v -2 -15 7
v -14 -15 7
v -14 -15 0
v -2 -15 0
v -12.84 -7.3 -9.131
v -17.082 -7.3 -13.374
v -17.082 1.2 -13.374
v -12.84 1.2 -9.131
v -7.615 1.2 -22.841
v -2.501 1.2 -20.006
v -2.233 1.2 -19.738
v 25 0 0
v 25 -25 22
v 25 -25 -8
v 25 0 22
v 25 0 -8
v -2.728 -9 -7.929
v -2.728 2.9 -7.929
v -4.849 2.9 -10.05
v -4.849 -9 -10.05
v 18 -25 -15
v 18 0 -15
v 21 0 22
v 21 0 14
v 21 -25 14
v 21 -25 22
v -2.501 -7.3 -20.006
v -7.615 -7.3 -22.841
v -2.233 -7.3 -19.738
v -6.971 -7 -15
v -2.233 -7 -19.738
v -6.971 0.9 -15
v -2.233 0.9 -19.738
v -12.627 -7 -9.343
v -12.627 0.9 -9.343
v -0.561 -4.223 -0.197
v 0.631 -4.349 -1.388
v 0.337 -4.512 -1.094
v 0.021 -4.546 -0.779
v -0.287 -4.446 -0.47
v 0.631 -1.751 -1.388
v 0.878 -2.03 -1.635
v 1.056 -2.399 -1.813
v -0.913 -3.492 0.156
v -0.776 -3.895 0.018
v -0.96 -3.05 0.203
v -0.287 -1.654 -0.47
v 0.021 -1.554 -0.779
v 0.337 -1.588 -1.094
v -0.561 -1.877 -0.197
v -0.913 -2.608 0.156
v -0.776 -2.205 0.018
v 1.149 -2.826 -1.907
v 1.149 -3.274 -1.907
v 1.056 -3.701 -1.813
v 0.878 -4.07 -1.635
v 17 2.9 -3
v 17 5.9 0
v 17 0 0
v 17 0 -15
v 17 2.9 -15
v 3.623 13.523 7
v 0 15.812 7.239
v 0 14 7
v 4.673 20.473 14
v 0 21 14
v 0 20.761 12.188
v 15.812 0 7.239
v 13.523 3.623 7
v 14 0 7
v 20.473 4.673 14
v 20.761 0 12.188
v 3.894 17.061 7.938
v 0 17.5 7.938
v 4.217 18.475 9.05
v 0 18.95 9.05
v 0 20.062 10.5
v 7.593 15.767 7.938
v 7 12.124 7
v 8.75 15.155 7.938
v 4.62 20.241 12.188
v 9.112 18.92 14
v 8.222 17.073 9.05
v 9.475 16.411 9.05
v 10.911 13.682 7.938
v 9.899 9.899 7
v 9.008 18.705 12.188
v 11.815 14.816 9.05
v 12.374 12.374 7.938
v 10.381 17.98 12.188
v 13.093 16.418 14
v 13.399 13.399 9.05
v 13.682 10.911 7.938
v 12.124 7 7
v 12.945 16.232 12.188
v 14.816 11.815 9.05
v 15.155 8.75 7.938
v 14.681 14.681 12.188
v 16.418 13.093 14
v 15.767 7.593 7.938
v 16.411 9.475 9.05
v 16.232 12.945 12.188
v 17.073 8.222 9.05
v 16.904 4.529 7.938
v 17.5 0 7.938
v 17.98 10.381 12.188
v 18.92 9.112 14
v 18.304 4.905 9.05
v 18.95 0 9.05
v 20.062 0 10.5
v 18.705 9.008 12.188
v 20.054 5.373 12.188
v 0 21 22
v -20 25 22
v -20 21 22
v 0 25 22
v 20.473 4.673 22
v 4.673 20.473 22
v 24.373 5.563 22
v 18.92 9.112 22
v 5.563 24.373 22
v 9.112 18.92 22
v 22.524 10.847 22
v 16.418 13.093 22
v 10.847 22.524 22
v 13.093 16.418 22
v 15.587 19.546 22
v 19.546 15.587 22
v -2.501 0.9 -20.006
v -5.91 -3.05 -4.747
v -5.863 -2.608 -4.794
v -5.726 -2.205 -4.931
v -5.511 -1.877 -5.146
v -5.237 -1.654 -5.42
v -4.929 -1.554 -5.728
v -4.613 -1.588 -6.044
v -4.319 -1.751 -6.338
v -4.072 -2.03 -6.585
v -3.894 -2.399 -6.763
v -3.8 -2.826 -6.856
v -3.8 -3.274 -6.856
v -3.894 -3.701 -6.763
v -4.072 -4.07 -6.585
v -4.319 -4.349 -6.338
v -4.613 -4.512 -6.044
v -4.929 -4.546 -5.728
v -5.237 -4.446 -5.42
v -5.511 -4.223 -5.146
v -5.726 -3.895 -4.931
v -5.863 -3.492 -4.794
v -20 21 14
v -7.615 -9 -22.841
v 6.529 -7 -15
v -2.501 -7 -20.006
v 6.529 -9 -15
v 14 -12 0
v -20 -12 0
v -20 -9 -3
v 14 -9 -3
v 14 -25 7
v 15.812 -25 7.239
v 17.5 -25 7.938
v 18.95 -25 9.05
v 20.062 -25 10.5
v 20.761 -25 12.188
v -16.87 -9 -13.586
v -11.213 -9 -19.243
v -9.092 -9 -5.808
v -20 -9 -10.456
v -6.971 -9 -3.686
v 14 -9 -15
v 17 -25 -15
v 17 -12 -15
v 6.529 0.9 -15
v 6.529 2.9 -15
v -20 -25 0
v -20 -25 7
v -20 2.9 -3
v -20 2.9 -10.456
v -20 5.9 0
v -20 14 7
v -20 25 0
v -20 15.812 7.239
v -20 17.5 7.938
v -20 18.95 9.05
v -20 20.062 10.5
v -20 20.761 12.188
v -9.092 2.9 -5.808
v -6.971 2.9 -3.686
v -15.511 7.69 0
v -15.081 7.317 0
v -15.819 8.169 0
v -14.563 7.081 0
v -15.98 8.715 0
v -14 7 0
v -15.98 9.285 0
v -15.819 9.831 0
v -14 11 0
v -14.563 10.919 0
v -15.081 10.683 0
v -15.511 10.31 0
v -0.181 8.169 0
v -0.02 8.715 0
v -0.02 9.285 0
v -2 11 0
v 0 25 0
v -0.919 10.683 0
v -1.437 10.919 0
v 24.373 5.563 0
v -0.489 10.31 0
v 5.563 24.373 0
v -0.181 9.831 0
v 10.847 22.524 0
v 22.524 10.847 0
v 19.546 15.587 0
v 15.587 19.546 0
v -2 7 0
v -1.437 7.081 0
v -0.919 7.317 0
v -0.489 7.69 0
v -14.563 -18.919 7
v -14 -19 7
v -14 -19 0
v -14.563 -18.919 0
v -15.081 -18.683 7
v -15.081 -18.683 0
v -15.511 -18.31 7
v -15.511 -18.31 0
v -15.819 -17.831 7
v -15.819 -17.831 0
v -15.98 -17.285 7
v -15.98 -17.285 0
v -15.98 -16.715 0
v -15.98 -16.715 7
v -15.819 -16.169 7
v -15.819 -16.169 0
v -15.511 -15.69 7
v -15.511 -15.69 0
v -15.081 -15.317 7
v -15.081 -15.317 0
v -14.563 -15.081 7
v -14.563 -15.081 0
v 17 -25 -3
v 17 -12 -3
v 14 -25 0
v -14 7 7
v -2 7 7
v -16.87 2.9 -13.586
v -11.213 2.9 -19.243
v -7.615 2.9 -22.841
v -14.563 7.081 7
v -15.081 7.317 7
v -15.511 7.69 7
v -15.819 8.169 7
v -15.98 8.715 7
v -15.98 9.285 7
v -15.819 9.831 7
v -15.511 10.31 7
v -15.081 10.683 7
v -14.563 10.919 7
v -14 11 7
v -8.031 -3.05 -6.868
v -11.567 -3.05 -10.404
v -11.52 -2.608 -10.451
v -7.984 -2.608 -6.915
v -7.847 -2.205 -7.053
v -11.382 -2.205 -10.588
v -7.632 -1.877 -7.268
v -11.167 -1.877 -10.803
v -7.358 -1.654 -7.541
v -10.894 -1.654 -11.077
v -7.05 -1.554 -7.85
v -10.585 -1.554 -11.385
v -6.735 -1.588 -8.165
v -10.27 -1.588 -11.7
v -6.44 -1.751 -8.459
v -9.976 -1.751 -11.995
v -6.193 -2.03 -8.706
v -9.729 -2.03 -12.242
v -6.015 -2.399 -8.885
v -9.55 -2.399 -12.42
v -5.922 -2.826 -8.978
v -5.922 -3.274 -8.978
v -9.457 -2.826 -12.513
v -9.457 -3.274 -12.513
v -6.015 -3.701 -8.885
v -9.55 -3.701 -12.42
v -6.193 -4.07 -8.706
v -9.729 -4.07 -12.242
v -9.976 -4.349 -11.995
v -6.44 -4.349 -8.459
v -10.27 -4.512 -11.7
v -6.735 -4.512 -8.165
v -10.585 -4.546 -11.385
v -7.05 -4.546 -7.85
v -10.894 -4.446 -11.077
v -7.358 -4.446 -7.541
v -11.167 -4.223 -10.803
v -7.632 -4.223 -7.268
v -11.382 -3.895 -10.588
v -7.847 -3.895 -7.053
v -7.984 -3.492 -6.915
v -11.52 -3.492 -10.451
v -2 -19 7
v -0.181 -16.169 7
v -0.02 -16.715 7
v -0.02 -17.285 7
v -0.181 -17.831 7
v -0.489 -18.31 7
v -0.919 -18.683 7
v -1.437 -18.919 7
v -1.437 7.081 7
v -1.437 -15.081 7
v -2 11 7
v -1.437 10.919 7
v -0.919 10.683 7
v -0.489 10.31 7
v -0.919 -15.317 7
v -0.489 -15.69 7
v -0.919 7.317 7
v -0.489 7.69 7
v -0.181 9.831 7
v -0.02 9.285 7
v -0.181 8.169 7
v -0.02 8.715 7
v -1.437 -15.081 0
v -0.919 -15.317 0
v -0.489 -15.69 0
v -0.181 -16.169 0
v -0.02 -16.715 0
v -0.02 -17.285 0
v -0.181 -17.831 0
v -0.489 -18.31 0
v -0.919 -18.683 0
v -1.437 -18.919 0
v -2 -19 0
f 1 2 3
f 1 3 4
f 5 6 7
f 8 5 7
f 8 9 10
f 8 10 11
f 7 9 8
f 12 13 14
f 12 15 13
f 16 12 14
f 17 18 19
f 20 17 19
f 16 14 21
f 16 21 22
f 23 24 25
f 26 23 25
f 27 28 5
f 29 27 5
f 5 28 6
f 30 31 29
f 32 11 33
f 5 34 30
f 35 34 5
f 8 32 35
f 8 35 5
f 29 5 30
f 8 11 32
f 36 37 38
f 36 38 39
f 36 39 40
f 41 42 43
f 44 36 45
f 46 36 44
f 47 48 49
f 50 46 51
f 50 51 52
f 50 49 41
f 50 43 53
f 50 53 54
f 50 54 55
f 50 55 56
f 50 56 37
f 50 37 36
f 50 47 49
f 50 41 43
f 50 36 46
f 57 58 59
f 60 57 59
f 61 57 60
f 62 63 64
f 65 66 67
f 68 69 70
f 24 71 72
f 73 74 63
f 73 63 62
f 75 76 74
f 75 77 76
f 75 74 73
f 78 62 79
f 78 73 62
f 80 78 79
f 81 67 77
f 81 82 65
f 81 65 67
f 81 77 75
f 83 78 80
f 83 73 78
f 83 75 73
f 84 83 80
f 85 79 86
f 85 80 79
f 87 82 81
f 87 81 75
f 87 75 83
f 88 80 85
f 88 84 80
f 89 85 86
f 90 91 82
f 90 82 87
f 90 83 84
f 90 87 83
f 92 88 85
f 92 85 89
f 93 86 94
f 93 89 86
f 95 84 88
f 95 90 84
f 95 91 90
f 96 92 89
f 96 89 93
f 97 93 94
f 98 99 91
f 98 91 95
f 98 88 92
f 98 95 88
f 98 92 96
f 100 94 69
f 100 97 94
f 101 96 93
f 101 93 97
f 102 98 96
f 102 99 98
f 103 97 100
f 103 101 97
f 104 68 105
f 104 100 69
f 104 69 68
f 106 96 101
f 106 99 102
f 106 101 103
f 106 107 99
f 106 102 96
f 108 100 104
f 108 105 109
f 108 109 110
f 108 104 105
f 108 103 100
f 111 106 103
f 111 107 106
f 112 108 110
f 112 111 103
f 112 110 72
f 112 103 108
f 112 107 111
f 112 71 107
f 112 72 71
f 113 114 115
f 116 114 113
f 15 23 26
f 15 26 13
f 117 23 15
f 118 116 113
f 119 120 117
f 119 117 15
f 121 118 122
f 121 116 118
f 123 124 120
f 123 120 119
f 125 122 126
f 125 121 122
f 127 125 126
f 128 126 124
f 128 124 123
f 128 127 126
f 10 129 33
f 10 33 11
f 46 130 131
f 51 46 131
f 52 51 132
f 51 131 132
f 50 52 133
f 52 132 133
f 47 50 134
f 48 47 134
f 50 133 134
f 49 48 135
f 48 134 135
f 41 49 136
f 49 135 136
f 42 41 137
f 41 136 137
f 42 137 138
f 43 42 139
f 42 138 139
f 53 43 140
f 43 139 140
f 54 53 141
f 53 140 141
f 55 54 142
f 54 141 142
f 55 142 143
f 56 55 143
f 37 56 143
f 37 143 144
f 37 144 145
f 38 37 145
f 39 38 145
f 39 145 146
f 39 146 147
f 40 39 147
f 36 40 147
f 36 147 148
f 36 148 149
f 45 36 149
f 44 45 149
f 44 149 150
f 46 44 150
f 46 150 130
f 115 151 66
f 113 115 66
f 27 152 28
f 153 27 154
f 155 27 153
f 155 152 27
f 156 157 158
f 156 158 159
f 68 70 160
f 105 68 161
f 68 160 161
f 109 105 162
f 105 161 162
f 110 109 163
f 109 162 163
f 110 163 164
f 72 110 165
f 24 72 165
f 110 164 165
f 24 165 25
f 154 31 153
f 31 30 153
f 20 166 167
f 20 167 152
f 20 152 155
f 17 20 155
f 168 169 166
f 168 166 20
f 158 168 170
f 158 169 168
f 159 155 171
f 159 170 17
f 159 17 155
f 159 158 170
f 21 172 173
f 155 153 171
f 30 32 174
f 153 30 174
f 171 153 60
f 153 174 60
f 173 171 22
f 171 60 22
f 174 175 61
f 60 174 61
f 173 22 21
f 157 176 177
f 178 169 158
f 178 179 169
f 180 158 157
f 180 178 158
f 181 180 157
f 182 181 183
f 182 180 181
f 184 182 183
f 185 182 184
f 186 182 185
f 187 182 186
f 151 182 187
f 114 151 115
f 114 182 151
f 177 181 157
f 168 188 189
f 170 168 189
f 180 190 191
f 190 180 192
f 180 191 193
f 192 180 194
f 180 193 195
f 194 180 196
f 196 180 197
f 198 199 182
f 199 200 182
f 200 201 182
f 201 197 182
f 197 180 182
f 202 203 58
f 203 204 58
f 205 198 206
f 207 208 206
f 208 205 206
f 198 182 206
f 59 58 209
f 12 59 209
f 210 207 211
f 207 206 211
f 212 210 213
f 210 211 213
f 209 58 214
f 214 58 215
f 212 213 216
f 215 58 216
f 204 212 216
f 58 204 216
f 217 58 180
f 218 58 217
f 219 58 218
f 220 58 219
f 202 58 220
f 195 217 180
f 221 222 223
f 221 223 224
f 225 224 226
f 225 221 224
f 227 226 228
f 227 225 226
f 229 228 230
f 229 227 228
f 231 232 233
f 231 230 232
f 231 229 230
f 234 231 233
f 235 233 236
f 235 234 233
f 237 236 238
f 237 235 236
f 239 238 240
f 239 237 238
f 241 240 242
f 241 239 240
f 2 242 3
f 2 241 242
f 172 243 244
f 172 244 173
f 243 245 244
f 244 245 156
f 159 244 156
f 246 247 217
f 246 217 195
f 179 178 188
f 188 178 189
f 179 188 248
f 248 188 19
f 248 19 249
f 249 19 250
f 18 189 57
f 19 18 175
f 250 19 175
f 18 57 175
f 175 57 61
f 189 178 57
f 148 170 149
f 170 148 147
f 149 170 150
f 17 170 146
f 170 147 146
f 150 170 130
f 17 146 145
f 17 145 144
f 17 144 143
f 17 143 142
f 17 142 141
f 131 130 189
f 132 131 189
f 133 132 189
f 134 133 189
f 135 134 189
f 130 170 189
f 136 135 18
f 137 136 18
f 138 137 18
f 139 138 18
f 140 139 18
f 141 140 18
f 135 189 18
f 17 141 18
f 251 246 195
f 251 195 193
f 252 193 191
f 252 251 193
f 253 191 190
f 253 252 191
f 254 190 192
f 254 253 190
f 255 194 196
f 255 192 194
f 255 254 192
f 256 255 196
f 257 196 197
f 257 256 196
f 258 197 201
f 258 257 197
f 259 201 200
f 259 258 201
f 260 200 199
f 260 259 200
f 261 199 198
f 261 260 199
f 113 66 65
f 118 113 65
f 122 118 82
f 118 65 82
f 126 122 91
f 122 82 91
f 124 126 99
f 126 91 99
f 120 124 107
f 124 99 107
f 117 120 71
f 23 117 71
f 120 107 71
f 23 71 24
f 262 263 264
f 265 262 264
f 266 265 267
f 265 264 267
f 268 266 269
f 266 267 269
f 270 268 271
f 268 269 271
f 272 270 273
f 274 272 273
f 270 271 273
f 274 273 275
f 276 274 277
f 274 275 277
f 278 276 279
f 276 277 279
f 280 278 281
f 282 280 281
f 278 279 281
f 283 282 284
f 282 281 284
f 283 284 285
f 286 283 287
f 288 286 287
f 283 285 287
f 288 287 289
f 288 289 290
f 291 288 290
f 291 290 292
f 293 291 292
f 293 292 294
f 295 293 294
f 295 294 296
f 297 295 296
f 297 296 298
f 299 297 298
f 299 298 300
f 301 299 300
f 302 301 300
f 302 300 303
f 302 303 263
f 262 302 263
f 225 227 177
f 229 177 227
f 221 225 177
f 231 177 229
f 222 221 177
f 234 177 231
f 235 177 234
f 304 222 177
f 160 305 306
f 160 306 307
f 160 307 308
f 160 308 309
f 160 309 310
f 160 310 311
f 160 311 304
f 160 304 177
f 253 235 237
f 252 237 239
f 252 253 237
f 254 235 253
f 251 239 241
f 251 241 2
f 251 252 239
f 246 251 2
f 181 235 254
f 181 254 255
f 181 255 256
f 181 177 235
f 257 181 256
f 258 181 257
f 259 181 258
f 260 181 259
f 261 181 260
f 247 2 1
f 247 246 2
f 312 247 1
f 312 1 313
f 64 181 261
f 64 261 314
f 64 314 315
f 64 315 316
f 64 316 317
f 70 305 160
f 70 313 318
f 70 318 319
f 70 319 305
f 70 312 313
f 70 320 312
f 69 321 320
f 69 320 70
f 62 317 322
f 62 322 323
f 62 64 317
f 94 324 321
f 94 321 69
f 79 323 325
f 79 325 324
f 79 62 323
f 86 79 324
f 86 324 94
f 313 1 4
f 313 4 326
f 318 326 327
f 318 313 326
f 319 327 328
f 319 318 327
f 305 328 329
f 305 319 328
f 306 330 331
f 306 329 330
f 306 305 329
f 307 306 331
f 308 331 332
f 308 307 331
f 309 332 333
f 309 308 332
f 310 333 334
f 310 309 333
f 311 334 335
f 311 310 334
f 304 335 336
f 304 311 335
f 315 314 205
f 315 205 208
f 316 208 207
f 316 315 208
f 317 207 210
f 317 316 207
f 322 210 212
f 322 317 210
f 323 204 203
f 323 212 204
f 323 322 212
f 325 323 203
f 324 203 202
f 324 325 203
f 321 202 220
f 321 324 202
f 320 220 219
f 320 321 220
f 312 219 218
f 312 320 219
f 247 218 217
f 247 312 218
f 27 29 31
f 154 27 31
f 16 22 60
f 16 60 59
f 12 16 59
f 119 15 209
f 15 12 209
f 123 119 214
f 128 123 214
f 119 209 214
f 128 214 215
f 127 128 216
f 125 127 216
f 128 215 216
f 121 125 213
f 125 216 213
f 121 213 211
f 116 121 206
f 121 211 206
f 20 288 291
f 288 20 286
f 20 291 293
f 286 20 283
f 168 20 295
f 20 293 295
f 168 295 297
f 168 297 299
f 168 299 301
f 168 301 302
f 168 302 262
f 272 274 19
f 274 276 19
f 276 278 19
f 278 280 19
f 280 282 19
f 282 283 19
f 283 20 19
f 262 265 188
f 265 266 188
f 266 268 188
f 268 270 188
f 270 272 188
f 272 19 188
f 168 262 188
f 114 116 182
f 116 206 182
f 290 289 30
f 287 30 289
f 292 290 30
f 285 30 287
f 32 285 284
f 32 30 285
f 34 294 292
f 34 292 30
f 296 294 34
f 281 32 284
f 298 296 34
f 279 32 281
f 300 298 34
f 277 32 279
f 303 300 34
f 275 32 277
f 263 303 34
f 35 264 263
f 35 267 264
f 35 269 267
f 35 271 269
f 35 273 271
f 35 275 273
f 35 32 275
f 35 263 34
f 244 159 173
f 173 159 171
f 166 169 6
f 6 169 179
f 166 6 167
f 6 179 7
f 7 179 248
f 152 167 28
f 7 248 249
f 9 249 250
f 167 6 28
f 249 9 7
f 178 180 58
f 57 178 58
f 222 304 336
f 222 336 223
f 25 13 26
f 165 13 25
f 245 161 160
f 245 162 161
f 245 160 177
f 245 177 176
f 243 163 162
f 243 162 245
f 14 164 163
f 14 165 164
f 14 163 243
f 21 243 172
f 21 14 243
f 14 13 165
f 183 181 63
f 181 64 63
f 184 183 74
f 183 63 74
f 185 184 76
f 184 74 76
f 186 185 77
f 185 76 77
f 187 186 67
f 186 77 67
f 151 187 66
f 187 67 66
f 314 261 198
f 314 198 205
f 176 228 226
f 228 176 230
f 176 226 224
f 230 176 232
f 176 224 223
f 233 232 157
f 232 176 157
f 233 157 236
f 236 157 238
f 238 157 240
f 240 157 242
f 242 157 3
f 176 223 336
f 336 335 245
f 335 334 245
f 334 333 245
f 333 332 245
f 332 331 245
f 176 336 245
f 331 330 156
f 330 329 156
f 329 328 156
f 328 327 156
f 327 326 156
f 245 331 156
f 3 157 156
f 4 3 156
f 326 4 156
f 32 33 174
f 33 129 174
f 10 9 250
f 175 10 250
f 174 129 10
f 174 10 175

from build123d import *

# Parameters (mm, degrees)
BOSS_EXTRUDE1_DEPTH      = 7
EXTRUDE_THIN2_DEPTH      = 15
FILLET1_R                = 7
SKETCH5_W                = 15
SKETCH5_H                = 25
BOSS_EXTRUDE2_DEPTH      = 8
CUT_EXTRUDE2_DEPTH       = 42.641325627
LPATTERN1_COUNT          = 2
LPATTERN1_PITCH          = 26
CHAMFER3_SIZE            = 7
SKETCH9_W                = 15
SKETCH9_H                = 7
BOSS_EXTRUDE3_DEPTH      = 15
BOSS_EXTRUDE4_DEPTH      = 2
BOSS_EXTRUDE4_DEPTH_BACK = 9.9
SKETCH13_W               = 8
SKETCH13_H               = 2
BOSS_EXTRUDE6_DEPTH      = 6
CHAMFER6_SIZE            = 23.744712882
CHAMFER6_SIZE_2          = 13.5
CHAMFER7_SIZE            = 3
SKETCH14_R               = 1.5
CUT_EXTRUDE3_DEPTH       = 15
SKETCH15_W               = 15
SKETCH15_H               = 8.5
CUT_EXTRUDE4_DEPTH       = 6


with BuildPart() as part:
    # Sketch1 → Boss-Extrude1 (new body)
    with BuildSketch(Plane.XY):
        with BuildLine():
            Line((0, 25), (-20, 25))
            Line((-20, 25), (-20, -25))
            Line((-20, -25), (25, -25))
            Line((25, -25), (25, 0))
            ThreePointArc((25, 0), (17.67766953, 17.67766953), (0, 25))
        make_face()
    extrude(amount=BOSS_EXTRUDE1_DEPTH)

    # Sketch3 → Extrude-Thin2 (add)
    with BuildSketch(Plane.XY.offset(7)):
        with BuildLine():
            Line((25, -25), (25, 0))
            ThreePointArc((25, 0), (17.67766953, 17.67766953), (0, 25))
            Line((0, 25), (-20, 25))
            Line((-20, 25), (-20, 21))
            Line((-20, 21), (0, 21))
            ThreePointArc((0, 21), (14.849242405, 14.849242405), (21, 0))
            Line((21, 0), (21, -25))
            Line((21, -25), (25, -25))
        make_face()
    extrude(amount=EXTRUDE_THIN2_DEPTH)

    # Fillet1
    fillet1_edges = [part.edges().sort_by_distance(p)[0] for p in [
        (21, -12.5, 7),
        (14.849242405, 14.849242405, 7),
        (-10, 21, 7),
    ]]
    fillet(fillet1_edges, radius=FILLET1_R)

    # Sketch5 → Boss-Extrude2 (add)
    with BuildSketch(Plane(origin=(25, 0, 0), x_dir=(0, 0, -1), z_dir=(1, 0, 0))):
        with Locations((7.5, -12.5)):
            Rectangle(SKETCH5_W, SKETCH5_H)
    extrude(amount=-BOSS_EXTRUDE2_DEPTH)

    # Sketch8 → Cut-Extrude2 (cut, through all)
    with BuildSketch(Plane.XY.offset(7)):
        with BuildLine():
            Line((-14, -15), (-2, -15))
            ThreePointArc((-2, -15), (0, -17), (-2, -19))
            Line((-2, -19), (-14, -19))
            ThreePointArc((-14, -19), (-16, -17), (-14, -15))
        make_face()
    cut_extrude2 = extrude(amount=-CUT_EXTRUDE2_DEPTH, mode=Mode.SUBTRACT)

    # LPattern1: Cut-Extrude2 ×2
    with Locations(*[(0, i * LPATTERN1_PITCH, 0) for i in range(1, LPATTERN1_COUNT)]):
        add(cut_extrude2, mode=Mode.SUBTRACT)

    # Chamfer3
    chamfer3_edges = [part.edges().sort_by_distance(p)[0] for p in [
        (25, -12.5, -15),
    ]]
    chamfer(chamfer3_edges, length=CHAMFER3_SIZE)

    # Sketch9 → Boss-Extrude3 (add)
    with BuildSketch(Plane.ZY.offset(-17)):
        with Locations((-7.5, -3.5)):
            Rectangle(SKETCH9_W, SKETCH9_H)
    extrude(amount=BOSS_EXTRUDE3_DEPTH)

    # Sketch10 → Boss-Extrude4 (add, two sides: drawn at the far end of the back side and taken through both)
    with BuildSketch(Plane.XZ.offset(7).offset(-BOSS_EXTRUDE4_DEPTH_BACK)):
        Polygon((2, -15), (-6.970562748, -15), (-12.627416998, -9.343145751), (-16.870057685, -13.585786438), (-20, -10.455844123), (-20, 0), (17, 0), (17, -15), align=None)
        Polygon((-4.849242405, -10.050252532), (-9.091883092, -5.807611845), (-6.970562748, -3.686291501), (-2.727922061, -7.928932188), align=None, mode=Mode.SUBTRACT)
    extrude(amount=BOSS_EXTRUDE4_DEPTH + BOSS_EXTRUDE4_DEPTH_BACK)

    # Sketch13 → Boss-Extrude6 (add)
    with BuildSketch(Plane(origin=(-10.985281374, 0, -10.985281374), x_dir=(-0.7071067811865478, 0, 0.7071067811865472), z_dir=(-0.7071067811865472, 0, -0.7071067811865478))):
        with Locations((-1.67766953, 1.9)):
            Rectangle(SKETCH13_W, SKETCH13_H)
        with Locations((-1.67766953, -8)):
            Rectangle(SKETCH13_W, SKETCH13_H)
    extrude(amount=BOSS_EXTRUDE6_DEPTH)

    # Chamfer6
    # the kernel refuses this chamfer: 23.744712882, 13.5 mm, written as the material it adds along each edge
    with BuildSketch(Plane(origin=(-6.970562748, -9, -15), x_dir=(-0.7145740403020574, 0, -0.6995598194053126), z_dir=(0, 1, 0))) as chamfer6_piece_1_section:
        Polygon((CHAMFER6_SIZE * 0.999943641689, -CHAMFER6_SIZE * 0.0106166574102), (-CHAMFER6_SIZE_2 * 0.714574040302, -CHAMFER6_SIZE_2 * 0.699559819405), (0, 0), align=None)
    chamfer6_piece_1 = extrude(amount=2, mode=Mode.PRIVATE)
    chamfer6_piece_1 = split(chamfer6_piece_1, bisect_by=Plane(origin=(-9.095447466, -8, -21.360396657), z_dir=(0.7071067811865476, 0, 0.7071067811865476)), keep=Keep.TOP, mode=Mode.PRIVATE)
    add(chamfer6_piece_1)
    with BuildSketch(Plane(origin=(-6.970562748, -70.647744863, -15), x_dir=(-0.7145740403020574, 0, -0.6995598194053126), z_dir=(0, 1, 0))) as chamfer6_piece_2_section:
        Polygon((CHAMFER6_SIZE * 0.999943641689, -CHAMFER6_SIZE * 0.0106166574102), (-CHAMFER6_SIZE_2 * 0.714574040302, -CHAMFER6_SIZE_2 * 0.699559819405), (0, 0), align=None)
    chamfer6_piece_2 = extrude(amount=125.295489727, mode=Mode.PRIVATE)
    chamfer6_piece_2 = split(chamfer6_piece_2, bisect_by=Plane(origin=(-6.871868761, 2.9, -19.136817952), z_dir=(0, -1, 0)), keep=Keep.TOP, mode=Mode.PRIVATE)
    chamfer6_piece_2 = split(chamfer6_piece_2, bisect_by=Plane(origin=(-6.871868761, 0.9, -19.136817952), z_dir=(0, 1, 0)), keep=Keep.TOP, mode=Mode.PRIVATE)
    chamfer6_piece_2 = split(chamfer6_piece_2, bisect_by=Plane(origin=(-9.095447466, 1.9, -21.360396657), z_dir=(0.7071067811865476, 0, 0.7071067811865476)), keep=Keep.TOP, mode=Mode.PRIVATE)
    add(chamfer6_piece_2)
    with BuildSketch(Plane(origin=(-6.970562748, -60.747744863, -15), x_dir=(-0.7145740403020574, 0, -0.6995598194053126), z_dir=(0, 1, 0))) as chamfer6_piece_3_section:
        Polygon((CHAMFER6_SIZE * 0.999943641689, -CHAMFER6_SIZE * 0.0106166574102), (-CHAMFER6_SIZE_2 * 0.714574040302, -CHAMFER6_SIZE_2 * 0.699559819405), (0, 0), align=None)
    chamfer6_piece_3 = extrude(amount=125.295489727, mode=Mode.PRIVATE)
    chamfer6_piece_3 = split(chamfer6_piece_3, bisect_by=Plane(origin=(-6.871868761, -7, -19.136817952), z_dir=(0, -1, 0)), keep=Keep.TOP, mode=Mode.PRIVATE)
    chamfer6_piece_3 = split(chamfer6_piece_3, bisect_by=Plane(origin=(-9.095447466, -8, -21.360396657), z_dir=(0.7071067811865476, 0, 0.7071067811865476)), keep=Keep.TOP, mode=Mode.PRIVATE)
    chamfer6_piece_3 = split(chamfer6_piece_3, bisect_by=Plane(origin=(-6.871868761, -9, -19.136817952), z_dir=(0, 1, 0)), keep=Keep.TOP, mode=Mode.PRIVATE)
    add(chamfer6_piece_3)
    with BuildSketch(Plane(origin=(-6.970562748, 0.9, -15), x_dir=(-0.7145740403020574, 0, -0.6995598194053126), z_dir=(0, 1, 0))) as chamfer6_piece_4_section:
        Polygon((CHAMFER6_SIZE * 0.999943641689, -CHAMFER6_SIZE * 0.0106166574102), (-CHAMFER6_SIZE_2 * 0.714574040302, -CHAMFER6_SIZE_2 * 0.699559819405), (0, 0), align=None)
    chamfer6_piece_4 = extrude(amount=2, mode=Mode.PRIVATE)
    chamfer6_piece_4 = split(chamfer6_piece_4, bisect_by=Plane(origin=(-9.095447466, 1.9, -21.360396657), z_dir=(0.7071067811865476, 0, 0.7071067811865476)), keep=Keep.TOP, mode=Mode.PRIVATE)
    add(chamfer6_piece_4)

    # Chamfer7
    chamfer7_edges = [part.edges().sort_by_distance(p)[0] for p in [
        (-1.5, 2.9, 0),
        (17, -9, -7.5),
        (17, -17, 0),
        (-1.5, -9, 0),
    ]]
    chamfer(chamfer7_edges, length=CHAMFER7_SIZE)

    # Sketch14 → Cut-Extrude3 (cut)
    with BuildSketch(Plane(origin=(-10.985281374, 0, -10.985281374), x_dir=(-0.7071067811865478, 0, 0.7071067811865472), z_dir=(-0.7071067811865472, 0, -0.7071067811865478))):
        with Locations((-0.67766953, -3.05)):
            Circle(SKETCH14_R)
    extrude(amount=-CUT_EXTRUDE3_DEPTH, mode=Mode.SUBTRACT)

    # Sketch15 → Cut-Extrude4 (cut)
    with BuildSketch(Plane(origin=(-15.227922061, 0, -15.227922061), x_dir=(-0.7071067811865475, 0, 0.7071067811865477), z_dir=(-0.7071067811865477, 0, -0.7071067811865475))):
        with Locations((-4.87766953, -3.05)):
            Rectangle(SKETCH15_W, SKETCH15_H)
    extrude(amount=-CUT_EXTRUDE4_DEPTH, mode=Mode.SUBTRACT)


solid = part.part
